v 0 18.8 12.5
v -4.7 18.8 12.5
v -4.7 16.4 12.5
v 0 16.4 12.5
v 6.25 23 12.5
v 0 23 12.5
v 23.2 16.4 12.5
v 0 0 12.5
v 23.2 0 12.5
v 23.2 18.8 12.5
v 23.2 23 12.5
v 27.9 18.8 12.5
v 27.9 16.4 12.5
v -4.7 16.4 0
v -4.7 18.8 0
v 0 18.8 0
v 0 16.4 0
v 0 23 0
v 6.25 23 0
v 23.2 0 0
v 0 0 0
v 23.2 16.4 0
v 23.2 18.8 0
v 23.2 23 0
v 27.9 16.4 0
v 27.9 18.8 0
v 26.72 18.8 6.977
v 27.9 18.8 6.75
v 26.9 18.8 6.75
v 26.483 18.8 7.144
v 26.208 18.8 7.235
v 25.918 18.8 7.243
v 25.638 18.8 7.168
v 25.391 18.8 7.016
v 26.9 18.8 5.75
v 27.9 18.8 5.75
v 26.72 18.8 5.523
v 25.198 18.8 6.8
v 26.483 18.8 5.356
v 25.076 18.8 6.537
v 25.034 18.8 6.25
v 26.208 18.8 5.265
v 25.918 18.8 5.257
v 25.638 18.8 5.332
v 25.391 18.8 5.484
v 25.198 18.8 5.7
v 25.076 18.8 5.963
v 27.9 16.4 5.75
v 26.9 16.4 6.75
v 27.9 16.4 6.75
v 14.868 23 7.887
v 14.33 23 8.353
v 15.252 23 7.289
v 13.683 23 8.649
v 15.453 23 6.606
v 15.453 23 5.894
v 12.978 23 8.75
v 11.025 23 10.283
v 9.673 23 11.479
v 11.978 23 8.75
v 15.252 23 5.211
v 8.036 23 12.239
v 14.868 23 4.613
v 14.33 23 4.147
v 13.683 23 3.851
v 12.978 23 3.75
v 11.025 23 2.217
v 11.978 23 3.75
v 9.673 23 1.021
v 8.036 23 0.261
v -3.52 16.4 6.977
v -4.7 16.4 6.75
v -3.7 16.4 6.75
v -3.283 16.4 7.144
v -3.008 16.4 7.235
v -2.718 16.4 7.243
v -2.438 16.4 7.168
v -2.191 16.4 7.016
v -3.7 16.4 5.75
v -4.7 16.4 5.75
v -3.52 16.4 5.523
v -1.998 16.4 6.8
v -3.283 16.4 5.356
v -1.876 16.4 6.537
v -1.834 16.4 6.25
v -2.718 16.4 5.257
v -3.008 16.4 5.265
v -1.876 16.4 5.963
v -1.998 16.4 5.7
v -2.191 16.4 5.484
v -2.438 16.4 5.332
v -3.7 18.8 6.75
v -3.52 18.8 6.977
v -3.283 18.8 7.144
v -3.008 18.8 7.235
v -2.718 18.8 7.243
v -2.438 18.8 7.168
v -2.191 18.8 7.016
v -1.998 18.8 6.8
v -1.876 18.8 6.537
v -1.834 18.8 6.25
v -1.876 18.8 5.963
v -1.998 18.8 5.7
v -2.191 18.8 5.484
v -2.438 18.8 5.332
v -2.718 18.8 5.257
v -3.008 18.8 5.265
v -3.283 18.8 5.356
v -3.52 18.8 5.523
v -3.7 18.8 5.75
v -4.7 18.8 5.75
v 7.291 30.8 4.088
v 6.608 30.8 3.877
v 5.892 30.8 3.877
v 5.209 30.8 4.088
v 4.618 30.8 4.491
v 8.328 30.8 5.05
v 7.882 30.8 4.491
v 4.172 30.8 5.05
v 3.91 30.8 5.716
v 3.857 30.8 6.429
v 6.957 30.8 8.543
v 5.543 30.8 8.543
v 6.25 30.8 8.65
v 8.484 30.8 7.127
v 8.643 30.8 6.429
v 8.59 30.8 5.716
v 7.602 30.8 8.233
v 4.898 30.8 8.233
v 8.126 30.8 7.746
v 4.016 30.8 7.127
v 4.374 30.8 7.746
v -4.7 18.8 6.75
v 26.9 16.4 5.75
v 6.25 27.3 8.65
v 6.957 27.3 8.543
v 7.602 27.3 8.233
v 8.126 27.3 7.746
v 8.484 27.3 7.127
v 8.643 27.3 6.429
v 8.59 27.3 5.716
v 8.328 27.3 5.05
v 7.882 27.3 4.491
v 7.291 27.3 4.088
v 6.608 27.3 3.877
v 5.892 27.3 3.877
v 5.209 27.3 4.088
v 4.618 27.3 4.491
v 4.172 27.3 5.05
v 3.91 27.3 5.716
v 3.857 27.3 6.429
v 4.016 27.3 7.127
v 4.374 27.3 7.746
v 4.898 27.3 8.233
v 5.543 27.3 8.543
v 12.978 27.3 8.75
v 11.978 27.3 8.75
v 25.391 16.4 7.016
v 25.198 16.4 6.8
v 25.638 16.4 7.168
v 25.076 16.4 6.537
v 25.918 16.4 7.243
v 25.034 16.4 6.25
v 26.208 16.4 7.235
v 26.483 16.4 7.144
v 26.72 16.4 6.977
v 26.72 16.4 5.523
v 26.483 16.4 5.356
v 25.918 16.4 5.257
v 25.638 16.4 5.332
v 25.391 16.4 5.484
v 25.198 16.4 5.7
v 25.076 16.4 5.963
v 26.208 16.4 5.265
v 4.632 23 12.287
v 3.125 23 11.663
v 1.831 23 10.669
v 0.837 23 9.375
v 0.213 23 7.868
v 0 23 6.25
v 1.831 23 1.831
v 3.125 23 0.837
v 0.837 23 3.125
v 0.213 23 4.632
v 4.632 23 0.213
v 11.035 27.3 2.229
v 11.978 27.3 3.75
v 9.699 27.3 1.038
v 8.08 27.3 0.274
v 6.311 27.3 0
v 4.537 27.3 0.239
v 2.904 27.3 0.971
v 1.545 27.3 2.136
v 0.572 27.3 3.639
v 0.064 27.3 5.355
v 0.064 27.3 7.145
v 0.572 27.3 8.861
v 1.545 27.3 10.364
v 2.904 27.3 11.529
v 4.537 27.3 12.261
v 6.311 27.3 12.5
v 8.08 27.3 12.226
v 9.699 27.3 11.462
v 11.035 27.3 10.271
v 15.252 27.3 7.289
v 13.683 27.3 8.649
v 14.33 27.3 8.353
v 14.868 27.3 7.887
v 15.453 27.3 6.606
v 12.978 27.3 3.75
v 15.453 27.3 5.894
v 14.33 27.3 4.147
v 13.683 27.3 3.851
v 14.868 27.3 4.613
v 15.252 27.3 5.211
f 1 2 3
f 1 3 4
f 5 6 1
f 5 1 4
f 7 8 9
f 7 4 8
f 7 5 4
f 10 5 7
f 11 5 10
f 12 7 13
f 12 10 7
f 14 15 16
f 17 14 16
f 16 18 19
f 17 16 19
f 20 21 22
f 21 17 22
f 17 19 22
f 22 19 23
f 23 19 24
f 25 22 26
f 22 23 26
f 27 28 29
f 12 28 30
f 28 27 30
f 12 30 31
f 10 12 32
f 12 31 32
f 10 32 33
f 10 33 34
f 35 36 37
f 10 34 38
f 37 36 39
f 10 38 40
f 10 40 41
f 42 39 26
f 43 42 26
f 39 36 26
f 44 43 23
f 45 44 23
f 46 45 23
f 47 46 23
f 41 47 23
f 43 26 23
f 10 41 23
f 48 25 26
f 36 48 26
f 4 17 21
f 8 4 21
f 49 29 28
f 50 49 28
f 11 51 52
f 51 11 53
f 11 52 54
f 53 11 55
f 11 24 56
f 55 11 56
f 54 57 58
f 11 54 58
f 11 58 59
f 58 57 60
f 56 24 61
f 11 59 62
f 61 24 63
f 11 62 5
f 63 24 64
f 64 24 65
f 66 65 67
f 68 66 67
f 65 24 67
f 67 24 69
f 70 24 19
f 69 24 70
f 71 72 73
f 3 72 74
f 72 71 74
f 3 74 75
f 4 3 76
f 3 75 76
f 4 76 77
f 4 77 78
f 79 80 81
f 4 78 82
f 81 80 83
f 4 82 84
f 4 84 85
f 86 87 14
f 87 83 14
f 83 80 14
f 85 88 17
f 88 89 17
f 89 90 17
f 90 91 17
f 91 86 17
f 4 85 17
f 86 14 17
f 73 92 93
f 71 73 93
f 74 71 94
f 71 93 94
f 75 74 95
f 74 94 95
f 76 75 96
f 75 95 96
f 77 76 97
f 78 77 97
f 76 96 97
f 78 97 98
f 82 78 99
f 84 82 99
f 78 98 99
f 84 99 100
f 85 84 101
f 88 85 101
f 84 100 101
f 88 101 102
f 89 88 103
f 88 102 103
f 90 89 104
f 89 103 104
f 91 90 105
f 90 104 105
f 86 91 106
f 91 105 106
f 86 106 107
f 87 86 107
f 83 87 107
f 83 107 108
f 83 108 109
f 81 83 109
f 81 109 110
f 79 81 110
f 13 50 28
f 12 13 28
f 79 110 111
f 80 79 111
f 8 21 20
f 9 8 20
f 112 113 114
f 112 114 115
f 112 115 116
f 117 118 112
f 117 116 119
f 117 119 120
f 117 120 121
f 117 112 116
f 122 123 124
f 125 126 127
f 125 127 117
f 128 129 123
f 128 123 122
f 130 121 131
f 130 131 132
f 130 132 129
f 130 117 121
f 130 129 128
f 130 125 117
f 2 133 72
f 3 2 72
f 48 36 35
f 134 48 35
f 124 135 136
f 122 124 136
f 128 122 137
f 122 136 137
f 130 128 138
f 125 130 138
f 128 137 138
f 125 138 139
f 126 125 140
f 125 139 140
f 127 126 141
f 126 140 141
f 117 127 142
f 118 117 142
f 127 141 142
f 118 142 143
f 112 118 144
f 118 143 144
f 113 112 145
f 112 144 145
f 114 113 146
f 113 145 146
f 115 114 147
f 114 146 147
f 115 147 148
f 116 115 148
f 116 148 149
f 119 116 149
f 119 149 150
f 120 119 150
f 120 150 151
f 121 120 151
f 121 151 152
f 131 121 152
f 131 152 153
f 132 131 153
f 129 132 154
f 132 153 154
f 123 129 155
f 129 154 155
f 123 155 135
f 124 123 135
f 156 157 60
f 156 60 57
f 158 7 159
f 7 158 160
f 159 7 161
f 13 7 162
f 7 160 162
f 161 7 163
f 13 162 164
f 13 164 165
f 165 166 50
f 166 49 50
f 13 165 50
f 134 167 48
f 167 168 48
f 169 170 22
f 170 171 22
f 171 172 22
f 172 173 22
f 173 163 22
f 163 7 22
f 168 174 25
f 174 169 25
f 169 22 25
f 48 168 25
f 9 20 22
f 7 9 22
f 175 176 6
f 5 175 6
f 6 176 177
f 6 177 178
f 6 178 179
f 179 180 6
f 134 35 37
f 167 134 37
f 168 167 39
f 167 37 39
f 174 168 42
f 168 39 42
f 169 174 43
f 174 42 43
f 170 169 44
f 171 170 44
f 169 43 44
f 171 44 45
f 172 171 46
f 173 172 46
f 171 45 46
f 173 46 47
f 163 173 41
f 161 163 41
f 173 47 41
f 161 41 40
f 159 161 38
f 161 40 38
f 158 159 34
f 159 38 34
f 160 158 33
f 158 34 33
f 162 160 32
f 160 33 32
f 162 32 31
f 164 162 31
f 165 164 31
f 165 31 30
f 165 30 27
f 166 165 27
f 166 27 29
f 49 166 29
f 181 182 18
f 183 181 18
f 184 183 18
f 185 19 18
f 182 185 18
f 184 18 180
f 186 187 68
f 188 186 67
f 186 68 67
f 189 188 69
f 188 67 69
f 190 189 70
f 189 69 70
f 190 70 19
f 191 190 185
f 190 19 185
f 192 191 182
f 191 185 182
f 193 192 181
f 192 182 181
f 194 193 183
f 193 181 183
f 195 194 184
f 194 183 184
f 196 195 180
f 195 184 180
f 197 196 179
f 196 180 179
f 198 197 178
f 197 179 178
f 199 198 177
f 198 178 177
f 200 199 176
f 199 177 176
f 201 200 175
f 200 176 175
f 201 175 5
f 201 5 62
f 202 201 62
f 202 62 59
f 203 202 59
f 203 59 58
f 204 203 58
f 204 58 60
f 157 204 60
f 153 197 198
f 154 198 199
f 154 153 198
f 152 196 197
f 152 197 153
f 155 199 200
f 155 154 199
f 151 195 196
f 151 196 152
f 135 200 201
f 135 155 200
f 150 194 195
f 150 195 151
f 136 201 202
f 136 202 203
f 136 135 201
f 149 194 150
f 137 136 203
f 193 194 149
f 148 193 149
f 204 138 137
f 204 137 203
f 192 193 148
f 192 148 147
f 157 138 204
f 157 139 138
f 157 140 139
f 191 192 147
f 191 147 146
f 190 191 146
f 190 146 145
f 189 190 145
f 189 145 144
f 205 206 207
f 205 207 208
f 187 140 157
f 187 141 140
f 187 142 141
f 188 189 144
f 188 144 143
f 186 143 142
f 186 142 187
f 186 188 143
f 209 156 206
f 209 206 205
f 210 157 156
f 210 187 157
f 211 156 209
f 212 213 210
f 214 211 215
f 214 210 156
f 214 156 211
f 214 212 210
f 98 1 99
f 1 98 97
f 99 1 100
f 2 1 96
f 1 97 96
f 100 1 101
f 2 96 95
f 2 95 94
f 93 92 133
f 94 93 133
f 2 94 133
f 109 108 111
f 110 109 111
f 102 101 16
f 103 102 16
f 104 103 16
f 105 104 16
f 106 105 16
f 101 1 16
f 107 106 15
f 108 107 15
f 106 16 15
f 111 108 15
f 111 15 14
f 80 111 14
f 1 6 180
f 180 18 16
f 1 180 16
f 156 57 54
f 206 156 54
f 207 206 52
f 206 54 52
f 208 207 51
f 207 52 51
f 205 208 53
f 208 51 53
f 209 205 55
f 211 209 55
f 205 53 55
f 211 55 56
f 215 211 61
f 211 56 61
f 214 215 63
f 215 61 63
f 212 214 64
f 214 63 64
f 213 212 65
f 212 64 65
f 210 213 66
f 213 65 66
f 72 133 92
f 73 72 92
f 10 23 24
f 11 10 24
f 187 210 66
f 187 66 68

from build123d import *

# Parameters (mm, degrees)
BOSS_EXTRUDE1_DEPTH = 12.5
BOSS_EXTRUDE2_DEPTH = 4.3
SKETCH4_R           = 2.4
BOSS_EXTRUDE3_DEPTH = 3.5
CUT_EXTRUDE1_REACH  = 37.89


with BuildPart() as part:
    # Sketch1 → Boss-Extrude1 (new body)
    with BuildSketch(Plane.XY):
        Polygon((0, 0), (23.2, 0), (23.2, 16.4), (27.9, 16.4), (27.9, 18.8), (23.2, 18.8), (23.2, 23), (0, 23), (0, 18.8), (-4.7, 18.8), (-4.7, 16.4), (0, 16.4), align=None)
    extrude(amount=BOSS_EXTRUDE1_DEPTH)

    # Sketch3 → Boss-Extrude2 (add)
    with BuildSketch(Plane(origin=(0, 23, 0), x_dir=(1, 0, 0), z_dir=(0, 1, 0))):
        with BuildLine():
            Line((11.978219619, -8.75), (12.978219619, -8.75))
            ThreePointArc((12.978219619, -8.75), (15.478219619, -6.25), (12.978219619, -3.75))
            Line((12.978219619, -3.75), (11.978219619, -3.75))
            ThreePointArc((11.978219619, -3.75), (0, -6.25), (11.978219619, -8.75))
        make_face()
    extrude(amount=BOSS_EXTRUDE2_DEPTH)

    # Sketch4 → Boss-Extrude3 (add)
    with BuildSketch(Plane(origin=(0, 27.3, 0), x_dir=(1, 0, 0), z_dir=(0, 1, 0))):
        with Locations(Location((6.25, -6.25, 0), (0, 0, 270))):
            Circle(SKETCH4_R)
    extrude(amount=BOSS_EXTRUDE3_DEPTH)

    # Sketch2 → Cut-Extrude1 (cut, up to next)
    with BuildSketch(Plane(origin=(0, 18.8, 0), x_dir=(1, 0, 0), z_dir=(0, 1, 0)), mode=Mode.PRIVATE) as cut_extrude1_sk1:
        with BuildLine():
            Line((27.9, -6.75), (27.9, -5.75))
            Line((27.9, -5.75), (26.9, -5.75))
            ThreePointArc((26.9, -5.75), (25.033974596, -6.25), (26.9, -6.75))
            Line((26.9, -6.75), (27.9, -6.75))
        make_face()
    cut_extrude1_tool1 = extrude(cut_extrude1_sk1.sketch, amount=-CUT_EXTRUDE1_REACH, mode=Mode.PRIVATE) & part.part
    # Sketch2 → Cut-Extrude1 (cut, up to next)
    with BuildSketch(Plane(origin=(0, 18.8, 0), x_dir=(1, 0, 0), z_dir=(0, 1, 0)), mode=Mode.PRIVATE) as cut_extrude1_sk2:
        with BuildLine():
            Line((-4.7, -6.75), (-3.7, -6.75))
            ThreePointArc((-3.7, -6.75), (-1.833974596, -6.25), (-3.7, -5.75))
            Line((-3.7, -5.75), (-4.7, -5.75))
            Line((-4.7, -5.75), (-4.7, -6.75))
        make_face()
    cut_extrude1_tool2 = extrude(cut_extrude1_sk2.sketch, amount=-CUT_EXTRUDE1_REACH, mode=Mode.PRIVATE) & part.part
    add(cut_extrude1_tool1.solids().sort_by_distance((26.35061, 18.8, 6.25))[0], mode=Mode.SUBTRACT)
    add(cut_extrude1_tool2.solids().sort_by_distance((-3.15061, 18.8, 6.25))[0], mode=Mode.SUBTRACT)


solid = part.part
